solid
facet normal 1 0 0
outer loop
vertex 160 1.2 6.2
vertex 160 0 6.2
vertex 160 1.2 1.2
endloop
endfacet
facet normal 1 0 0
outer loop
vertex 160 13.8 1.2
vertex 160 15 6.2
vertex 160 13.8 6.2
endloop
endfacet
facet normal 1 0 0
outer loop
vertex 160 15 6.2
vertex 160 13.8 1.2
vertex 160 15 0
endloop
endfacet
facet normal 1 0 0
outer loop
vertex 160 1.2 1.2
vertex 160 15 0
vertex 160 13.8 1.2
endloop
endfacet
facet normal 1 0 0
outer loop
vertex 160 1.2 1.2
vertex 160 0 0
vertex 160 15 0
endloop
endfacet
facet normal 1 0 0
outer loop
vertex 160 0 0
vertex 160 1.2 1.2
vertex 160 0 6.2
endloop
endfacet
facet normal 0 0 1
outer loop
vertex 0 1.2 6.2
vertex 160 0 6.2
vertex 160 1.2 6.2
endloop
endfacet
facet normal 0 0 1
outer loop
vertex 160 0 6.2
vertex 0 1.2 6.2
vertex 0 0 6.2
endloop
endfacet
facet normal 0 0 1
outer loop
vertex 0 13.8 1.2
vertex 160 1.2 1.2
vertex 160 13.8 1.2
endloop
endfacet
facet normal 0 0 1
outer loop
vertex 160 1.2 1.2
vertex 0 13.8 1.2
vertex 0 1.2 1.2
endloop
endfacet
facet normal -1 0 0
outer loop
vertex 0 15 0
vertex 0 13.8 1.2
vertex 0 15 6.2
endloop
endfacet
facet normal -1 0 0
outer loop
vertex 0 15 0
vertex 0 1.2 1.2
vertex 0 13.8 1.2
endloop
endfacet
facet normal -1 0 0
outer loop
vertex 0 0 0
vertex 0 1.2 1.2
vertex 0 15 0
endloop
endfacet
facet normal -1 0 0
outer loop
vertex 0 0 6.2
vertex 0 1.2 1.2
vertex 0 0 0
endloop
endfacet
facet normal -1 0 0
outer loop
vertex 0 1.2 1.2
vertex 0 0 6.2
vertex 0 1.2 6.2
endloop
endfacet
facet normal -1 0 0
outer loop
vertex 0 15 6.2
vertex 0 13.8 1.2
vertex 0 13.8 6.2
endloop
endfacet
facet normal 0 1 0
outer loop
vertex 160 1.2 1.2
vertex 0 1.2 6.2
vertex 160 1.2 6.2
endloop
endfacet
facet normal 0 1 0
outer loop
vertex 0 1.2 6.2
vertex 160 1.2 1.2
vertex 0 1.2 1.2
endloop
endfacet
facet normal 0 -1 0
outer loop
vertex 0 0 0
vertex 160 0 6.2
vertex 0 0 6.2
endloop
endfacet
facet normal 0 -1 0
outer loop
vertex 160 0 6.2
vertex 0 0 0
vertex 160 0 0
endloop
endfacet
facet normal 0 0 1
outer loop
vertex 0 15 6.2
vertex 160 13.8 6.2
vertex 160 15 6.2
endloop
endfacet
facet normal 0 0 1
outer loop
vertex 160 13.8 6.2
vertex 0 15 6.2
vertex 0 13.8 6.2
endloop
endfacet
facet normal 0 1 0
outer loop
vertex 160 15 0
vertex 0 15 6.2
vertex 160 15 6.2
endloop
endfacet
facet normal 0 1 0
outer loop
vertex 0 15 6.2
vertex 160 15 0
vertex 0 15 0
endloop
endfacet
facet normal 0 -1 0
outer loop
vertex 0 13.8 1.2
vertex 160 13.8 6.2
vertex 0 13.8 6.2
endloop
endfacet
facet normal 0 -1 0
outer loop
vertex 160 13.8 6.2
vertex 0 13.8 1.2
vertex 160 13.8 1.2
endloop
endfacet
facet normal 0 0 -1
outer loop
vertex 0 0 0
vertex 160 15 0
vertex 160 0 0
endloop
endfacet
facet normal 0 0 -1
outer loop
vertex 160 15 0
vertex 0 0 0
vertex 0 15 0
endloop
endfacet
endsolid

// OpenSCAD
// ScienceClaw nominal U-channel. All dimensions in millimeters.
// Clamp the first clamp_length along x. No holes or clamp reinforcement.
// Print parameters, layer orientation, material batch, and actual dimensions
// must be recorded separately; this file does not prescribe a qualified process.
length = 160;
clamp_length = 25;
base_width = 15;
wall_height = 5;
thickness = 1.2;
assert(length > clamp_length && clamp_length > 0);
assert(base_width > 2 * thickness && thickness > 0 && wall_height >= 0);
union() {
    cube([length, base_width, thickness]);
    if (wall_height > 0) {
        translate([0, 0, thickness]) cube([length, thickness, wall_height]);
        translate([0, base_width - thickness, thickness]) cube([length, thickness, wall_height]);
    }
}
